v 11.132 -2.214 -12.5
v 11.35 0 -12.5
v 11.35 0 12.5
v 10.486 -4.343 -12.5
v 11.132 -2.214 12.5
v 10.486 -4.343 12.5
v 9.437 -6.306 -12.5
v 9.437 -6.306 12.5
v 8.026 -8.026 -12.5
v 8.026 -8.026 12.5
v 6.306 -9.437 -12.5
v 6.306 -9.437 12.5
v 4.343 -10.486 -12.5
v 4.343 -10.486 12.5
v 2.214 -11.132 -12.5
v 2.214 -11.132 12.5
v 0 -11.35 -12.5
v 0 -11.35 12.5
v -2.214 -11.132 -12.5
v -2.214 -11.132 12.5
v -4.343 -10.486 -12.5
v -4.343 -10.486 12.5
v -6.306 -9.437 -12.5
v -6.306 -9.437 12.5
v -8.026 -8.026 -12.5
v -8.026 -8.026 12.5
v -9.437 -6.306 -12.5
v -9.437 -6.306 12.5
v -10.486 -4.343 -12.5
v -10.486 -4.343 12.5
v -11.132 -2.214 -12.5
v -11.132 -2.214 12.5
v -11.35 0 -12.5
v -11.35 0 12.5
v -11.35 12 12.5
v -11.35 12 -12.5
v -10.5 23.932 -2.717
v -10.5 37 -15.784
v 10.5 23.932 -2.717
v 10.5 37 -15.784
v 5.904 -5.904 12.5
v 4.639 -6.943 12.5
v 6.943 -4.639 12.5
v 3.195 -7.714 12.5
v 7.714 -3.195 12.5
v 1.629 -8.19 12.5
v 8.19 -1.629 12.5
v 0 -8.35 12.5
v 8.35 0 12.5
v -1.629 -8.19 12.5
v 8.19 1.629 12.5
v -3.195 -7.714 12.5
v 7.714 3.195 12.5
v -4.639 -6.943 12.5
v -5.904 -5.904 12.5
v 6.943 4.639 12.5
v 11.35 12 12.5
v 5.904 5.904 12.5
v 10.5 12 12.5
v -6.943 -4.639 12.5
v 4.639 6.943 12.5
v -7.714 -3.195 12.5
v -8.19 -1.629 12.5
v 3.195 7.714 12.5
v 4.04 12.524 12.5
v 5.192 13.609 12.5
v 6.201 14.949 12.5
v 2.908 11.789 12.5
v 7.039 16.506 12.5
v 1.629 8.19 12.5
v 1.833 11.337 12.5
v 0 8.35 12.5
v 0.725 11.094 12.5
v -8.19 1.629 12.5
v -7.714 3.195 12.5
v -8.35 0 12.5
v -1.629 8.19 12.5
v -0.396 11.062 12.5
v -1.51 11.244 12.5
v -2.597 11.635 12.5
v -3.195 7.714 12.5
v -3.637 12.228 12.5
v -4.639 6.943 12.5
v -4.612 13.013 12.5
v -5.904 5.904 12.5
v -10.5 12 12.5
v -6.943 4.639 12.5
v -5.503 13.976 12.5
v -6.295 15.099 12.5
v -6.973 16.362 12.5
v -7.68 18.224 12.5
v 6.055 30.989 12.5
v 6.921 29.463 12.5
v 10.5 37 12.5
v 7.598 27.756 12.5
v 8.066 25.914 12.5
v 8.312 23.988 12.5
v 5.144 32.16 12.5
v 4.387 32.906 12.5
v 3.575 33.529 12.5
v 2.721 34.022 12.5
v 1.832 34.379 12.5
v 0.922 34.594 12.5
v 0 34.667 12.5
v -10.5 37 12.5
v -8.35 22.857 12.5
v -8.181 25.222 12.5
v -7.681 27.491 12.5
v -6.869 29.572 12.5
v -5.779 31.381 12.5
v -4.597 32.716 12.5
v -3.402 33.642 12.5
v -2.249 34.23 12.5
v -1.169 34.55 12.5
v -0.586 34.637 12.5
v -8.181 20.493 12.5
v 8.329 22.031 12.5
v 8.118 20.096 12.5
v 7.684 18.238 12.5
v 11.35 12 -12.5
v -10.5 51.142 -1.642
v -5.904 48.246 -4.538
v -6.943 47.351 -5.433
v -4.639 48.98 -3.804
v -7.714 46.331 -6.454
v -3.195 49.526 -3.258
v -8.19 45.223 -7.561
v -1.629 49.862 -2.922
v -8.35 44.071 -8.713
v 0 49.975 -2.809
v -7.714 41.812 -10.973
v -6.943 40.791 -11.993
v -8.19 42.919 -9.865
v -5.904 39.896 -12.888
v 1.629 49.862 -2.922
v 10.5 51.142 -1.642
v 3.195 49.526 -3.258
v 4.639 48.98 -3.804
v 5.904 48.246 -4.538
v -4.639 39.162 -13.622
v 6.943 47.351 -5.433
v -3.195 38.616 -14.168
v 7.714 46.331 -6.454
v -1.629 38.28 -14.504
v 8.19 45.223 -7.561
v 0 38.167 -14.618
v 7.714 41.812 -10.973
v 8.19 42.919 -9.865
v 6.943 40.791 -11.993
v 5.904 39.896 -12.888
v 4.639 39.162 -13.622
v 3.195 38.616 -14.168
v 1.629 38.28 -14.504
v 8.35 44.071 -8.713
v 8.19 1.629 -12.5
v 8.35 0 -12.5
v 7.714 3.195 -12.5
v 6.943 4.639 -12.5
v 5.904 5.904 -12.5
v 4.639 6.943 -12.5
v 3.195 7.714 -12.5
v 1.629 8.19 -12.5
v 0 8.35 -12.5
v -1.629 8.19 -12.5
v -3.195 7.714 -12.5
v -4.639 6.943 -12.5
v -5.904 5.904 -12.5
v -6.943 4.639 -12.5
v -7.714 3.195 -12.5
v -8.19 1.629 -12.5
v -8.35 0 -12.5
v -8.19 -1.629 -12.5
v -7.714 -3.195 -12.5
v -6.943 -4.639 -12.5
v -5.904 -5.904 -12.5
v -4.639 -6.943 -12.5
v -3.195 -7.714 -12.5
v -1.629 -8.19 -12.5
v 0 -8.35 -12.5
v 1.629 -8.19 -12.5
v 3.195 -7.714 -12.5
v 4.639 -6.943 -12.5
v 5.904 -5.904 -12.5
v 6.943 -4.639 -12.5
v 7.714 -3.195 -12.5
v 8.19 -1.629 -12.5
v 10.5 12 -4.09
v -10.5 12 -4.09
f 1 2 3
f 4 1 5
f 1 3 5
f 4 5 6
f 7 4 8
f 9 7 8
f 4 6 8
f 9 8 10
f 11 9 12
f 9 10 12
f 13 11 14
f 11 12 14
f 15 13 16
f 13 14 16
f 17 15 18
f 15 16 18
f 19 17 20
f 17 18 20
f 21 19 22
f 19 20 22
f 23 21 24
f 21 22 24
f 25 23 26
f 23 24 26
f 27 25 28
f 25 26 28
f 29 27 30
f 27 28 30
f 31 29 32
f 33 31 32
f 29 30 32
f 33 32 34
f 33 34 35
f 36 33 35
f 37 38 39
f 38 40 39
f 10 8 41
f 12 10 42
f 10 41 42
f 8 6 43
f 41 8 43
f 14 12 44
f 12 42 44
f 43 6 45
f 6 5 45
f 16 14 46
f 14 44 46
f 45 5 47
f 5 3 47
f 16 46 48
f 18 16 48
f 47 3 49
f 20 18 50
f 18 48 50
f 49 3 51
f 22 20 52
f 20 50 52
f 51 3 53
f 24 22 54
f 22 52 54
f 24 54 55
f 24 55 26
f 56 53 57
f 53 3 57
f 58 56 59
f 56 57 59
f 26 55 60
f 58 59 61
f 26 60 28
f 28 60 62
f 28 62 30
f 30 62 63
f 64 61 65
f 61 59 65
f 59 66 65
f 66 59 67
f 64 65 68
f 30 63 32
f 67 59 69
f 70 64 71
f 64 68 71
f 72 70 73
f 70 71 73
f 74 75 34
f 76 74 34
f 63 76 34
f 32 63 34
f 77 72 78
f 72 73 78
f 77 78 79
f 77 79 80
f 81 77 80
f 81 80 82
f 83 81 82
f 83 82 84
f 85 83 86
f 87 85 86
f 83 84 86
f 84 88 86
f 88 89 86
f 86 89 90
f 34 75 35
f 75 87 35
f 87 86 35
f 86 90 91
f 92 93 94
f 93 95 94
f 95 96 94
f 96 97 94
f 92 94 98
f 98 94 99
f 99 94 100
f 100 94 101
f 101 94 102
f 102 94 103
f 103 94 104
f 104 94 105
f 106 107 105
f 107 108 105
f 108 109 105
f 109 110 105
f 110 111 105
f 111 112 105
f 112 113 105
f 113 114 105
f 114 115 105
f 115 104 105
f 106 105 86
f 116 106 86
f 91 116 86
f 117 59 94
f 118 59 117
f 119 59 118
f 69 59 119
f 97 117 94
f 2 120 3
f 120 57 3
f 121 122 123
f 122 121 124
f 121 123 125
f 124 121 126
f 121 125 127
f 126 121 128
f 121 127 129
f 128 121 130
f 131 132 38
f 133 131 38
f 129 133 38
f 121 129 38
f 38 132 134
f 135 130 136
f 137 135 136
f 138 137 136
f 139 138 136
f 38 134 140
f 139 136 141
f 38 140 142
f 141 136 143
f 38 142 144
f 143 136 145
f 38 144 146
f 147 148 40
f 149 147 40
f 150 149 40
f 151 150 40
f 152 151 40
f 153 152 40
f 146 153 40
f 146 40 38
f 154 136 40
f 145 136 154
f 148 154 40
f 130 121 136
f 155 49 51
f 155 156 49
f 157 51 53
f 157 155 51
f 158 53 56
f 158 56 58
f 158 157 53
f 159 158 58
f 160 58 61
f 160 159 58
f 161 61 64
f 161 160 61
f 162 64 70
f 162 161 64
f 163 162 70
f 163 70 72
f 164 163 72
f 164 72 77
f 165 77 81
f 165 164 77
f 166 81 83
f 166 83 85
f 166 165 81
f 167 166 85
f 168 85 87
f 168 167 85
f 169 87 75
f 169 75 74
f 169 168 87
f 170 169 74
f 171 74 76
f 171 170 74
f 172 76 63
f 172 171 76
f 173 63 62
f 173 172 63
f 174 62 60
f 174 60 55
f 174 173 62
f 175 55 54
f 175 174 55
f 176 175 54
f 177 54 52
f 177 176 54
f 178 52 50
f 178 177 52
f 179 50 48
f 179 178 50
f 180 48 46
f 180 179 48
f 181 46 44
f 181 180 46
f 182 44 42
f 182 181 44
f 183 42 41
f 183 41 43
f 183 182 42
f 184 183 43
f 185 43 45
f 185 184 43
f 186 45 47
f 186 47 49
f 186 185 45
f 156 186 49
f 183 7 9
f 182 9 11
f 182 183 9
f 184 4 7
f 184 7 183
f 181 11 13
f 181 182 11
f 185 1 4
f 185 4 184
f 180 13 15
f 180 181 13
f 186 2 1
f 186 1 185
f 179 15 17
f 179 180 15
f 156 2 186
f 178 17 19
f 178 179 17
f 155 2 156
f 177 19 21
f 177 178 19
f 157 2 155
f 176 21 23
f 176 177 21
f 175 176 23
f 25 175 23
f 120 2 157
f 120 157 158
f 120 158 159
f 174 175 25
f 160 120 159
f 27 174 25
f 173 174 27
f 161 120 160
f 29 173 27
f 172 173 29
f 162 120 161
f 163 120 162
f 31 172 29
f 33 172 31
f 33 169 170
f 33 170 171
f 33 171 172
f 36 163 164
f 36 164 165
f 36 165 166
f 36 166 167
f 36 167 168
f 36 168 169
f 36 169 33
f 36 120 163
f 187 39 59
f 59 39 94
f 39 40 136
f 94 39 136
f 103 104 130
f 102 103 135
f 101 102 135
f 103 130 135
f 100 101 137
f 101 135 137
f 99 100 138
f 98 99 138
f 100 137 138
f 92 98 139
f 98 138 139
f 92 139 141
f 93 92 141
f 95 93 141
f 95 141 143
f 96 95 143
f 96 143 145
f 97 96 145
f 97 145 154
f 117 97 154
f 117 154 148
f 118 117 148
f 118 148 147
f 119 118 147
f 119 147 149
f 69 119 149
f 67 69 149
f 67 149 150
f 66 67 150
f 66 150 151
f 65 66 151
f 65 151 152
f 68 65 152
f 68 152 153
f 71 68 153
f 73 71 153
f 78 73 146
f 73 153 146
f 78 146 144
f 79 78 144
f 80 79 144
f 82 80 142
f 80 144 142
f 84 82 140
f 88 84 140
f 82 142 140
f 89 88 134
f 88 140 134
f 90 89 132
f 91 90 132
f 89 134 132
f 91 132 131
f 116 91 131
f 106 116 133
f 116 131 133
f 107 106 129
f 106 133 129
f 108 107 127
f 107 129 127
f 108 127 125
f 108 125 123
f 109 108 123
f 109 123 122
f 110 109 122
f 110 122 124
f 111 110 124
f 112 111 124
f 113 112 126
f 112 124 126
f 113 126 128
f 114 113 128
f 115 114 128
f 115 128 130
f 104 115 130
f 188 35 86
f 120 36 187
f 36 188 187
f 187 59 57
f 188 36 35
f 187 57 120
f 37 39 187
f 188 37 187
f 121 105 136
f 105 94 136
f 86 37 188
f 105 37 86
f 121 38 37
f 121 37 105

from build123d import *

# Parameters (mm, degrees)
CROQUIS1_R              = 8.35
SALIENTE_EXTRUIR1_DEPTH = 12.5
SALIENTE_EXTRUIR2_DEPTH = 10.5
CROQUIS3_R              = 8.35
CORTAR_EXTRUIR1_DEPTH   = 47


with BuildPart() as part:
    # Croquis1 → Saliente-Extruir1 (new, symmetric)
    with BuildSketch(Plane.XY):
        with BuildLine():
            Line((-11.35, 12), (11.35, 12))
            Line((11.35, 12), (11.35, 0))
            ThreePointArc((11.35, 0), (0, -11.35), (-11.35, 0))
            Line((-11.35, 0), (-11.35, 12))
        make_face()
        Circle(CROQUIS1_R, mode=Mode.SUBTRACT)
    extrude(amount=SALIENTE_EXTRUIR1_DEPTH, both=True)

    # Croquis2 → Saliente-Extruir2 (add, symmetric)
    with BuildSketch(Plane(origin=(0, 0, 0), x_dir=(0, 0, -1), z_dir=(1, 0, 0))):
        Polygon((-12.5, 12), (-12.5, 37), (1.642135624, 51.142135624), (15.784271247, 37), (2.716681877, 23.93241063), (4.090100333, 12), align=None)
    extrude(amount=SALIENTE_EXTRUIR2_DEPTH, both=True)

    # Croquis3 → Cortar-Extruir1 (cut)
    with BuildSketch(Plane(origin=(0, 26.392135624, -26.392135624), x_dir=(1, 0, 0), z_dir=(0, 0.7071067811865465, -0.7071067811865487))):
        with Locations(Location((0, -25.001785669, 0), (0, 0, 270))):
            Circle(CROQUIS3_R)
    extrude(amount=-CORTAR_EXTRUIR1_DEPTH, mode=Mode.SUBTRACT)


solid = part.part
